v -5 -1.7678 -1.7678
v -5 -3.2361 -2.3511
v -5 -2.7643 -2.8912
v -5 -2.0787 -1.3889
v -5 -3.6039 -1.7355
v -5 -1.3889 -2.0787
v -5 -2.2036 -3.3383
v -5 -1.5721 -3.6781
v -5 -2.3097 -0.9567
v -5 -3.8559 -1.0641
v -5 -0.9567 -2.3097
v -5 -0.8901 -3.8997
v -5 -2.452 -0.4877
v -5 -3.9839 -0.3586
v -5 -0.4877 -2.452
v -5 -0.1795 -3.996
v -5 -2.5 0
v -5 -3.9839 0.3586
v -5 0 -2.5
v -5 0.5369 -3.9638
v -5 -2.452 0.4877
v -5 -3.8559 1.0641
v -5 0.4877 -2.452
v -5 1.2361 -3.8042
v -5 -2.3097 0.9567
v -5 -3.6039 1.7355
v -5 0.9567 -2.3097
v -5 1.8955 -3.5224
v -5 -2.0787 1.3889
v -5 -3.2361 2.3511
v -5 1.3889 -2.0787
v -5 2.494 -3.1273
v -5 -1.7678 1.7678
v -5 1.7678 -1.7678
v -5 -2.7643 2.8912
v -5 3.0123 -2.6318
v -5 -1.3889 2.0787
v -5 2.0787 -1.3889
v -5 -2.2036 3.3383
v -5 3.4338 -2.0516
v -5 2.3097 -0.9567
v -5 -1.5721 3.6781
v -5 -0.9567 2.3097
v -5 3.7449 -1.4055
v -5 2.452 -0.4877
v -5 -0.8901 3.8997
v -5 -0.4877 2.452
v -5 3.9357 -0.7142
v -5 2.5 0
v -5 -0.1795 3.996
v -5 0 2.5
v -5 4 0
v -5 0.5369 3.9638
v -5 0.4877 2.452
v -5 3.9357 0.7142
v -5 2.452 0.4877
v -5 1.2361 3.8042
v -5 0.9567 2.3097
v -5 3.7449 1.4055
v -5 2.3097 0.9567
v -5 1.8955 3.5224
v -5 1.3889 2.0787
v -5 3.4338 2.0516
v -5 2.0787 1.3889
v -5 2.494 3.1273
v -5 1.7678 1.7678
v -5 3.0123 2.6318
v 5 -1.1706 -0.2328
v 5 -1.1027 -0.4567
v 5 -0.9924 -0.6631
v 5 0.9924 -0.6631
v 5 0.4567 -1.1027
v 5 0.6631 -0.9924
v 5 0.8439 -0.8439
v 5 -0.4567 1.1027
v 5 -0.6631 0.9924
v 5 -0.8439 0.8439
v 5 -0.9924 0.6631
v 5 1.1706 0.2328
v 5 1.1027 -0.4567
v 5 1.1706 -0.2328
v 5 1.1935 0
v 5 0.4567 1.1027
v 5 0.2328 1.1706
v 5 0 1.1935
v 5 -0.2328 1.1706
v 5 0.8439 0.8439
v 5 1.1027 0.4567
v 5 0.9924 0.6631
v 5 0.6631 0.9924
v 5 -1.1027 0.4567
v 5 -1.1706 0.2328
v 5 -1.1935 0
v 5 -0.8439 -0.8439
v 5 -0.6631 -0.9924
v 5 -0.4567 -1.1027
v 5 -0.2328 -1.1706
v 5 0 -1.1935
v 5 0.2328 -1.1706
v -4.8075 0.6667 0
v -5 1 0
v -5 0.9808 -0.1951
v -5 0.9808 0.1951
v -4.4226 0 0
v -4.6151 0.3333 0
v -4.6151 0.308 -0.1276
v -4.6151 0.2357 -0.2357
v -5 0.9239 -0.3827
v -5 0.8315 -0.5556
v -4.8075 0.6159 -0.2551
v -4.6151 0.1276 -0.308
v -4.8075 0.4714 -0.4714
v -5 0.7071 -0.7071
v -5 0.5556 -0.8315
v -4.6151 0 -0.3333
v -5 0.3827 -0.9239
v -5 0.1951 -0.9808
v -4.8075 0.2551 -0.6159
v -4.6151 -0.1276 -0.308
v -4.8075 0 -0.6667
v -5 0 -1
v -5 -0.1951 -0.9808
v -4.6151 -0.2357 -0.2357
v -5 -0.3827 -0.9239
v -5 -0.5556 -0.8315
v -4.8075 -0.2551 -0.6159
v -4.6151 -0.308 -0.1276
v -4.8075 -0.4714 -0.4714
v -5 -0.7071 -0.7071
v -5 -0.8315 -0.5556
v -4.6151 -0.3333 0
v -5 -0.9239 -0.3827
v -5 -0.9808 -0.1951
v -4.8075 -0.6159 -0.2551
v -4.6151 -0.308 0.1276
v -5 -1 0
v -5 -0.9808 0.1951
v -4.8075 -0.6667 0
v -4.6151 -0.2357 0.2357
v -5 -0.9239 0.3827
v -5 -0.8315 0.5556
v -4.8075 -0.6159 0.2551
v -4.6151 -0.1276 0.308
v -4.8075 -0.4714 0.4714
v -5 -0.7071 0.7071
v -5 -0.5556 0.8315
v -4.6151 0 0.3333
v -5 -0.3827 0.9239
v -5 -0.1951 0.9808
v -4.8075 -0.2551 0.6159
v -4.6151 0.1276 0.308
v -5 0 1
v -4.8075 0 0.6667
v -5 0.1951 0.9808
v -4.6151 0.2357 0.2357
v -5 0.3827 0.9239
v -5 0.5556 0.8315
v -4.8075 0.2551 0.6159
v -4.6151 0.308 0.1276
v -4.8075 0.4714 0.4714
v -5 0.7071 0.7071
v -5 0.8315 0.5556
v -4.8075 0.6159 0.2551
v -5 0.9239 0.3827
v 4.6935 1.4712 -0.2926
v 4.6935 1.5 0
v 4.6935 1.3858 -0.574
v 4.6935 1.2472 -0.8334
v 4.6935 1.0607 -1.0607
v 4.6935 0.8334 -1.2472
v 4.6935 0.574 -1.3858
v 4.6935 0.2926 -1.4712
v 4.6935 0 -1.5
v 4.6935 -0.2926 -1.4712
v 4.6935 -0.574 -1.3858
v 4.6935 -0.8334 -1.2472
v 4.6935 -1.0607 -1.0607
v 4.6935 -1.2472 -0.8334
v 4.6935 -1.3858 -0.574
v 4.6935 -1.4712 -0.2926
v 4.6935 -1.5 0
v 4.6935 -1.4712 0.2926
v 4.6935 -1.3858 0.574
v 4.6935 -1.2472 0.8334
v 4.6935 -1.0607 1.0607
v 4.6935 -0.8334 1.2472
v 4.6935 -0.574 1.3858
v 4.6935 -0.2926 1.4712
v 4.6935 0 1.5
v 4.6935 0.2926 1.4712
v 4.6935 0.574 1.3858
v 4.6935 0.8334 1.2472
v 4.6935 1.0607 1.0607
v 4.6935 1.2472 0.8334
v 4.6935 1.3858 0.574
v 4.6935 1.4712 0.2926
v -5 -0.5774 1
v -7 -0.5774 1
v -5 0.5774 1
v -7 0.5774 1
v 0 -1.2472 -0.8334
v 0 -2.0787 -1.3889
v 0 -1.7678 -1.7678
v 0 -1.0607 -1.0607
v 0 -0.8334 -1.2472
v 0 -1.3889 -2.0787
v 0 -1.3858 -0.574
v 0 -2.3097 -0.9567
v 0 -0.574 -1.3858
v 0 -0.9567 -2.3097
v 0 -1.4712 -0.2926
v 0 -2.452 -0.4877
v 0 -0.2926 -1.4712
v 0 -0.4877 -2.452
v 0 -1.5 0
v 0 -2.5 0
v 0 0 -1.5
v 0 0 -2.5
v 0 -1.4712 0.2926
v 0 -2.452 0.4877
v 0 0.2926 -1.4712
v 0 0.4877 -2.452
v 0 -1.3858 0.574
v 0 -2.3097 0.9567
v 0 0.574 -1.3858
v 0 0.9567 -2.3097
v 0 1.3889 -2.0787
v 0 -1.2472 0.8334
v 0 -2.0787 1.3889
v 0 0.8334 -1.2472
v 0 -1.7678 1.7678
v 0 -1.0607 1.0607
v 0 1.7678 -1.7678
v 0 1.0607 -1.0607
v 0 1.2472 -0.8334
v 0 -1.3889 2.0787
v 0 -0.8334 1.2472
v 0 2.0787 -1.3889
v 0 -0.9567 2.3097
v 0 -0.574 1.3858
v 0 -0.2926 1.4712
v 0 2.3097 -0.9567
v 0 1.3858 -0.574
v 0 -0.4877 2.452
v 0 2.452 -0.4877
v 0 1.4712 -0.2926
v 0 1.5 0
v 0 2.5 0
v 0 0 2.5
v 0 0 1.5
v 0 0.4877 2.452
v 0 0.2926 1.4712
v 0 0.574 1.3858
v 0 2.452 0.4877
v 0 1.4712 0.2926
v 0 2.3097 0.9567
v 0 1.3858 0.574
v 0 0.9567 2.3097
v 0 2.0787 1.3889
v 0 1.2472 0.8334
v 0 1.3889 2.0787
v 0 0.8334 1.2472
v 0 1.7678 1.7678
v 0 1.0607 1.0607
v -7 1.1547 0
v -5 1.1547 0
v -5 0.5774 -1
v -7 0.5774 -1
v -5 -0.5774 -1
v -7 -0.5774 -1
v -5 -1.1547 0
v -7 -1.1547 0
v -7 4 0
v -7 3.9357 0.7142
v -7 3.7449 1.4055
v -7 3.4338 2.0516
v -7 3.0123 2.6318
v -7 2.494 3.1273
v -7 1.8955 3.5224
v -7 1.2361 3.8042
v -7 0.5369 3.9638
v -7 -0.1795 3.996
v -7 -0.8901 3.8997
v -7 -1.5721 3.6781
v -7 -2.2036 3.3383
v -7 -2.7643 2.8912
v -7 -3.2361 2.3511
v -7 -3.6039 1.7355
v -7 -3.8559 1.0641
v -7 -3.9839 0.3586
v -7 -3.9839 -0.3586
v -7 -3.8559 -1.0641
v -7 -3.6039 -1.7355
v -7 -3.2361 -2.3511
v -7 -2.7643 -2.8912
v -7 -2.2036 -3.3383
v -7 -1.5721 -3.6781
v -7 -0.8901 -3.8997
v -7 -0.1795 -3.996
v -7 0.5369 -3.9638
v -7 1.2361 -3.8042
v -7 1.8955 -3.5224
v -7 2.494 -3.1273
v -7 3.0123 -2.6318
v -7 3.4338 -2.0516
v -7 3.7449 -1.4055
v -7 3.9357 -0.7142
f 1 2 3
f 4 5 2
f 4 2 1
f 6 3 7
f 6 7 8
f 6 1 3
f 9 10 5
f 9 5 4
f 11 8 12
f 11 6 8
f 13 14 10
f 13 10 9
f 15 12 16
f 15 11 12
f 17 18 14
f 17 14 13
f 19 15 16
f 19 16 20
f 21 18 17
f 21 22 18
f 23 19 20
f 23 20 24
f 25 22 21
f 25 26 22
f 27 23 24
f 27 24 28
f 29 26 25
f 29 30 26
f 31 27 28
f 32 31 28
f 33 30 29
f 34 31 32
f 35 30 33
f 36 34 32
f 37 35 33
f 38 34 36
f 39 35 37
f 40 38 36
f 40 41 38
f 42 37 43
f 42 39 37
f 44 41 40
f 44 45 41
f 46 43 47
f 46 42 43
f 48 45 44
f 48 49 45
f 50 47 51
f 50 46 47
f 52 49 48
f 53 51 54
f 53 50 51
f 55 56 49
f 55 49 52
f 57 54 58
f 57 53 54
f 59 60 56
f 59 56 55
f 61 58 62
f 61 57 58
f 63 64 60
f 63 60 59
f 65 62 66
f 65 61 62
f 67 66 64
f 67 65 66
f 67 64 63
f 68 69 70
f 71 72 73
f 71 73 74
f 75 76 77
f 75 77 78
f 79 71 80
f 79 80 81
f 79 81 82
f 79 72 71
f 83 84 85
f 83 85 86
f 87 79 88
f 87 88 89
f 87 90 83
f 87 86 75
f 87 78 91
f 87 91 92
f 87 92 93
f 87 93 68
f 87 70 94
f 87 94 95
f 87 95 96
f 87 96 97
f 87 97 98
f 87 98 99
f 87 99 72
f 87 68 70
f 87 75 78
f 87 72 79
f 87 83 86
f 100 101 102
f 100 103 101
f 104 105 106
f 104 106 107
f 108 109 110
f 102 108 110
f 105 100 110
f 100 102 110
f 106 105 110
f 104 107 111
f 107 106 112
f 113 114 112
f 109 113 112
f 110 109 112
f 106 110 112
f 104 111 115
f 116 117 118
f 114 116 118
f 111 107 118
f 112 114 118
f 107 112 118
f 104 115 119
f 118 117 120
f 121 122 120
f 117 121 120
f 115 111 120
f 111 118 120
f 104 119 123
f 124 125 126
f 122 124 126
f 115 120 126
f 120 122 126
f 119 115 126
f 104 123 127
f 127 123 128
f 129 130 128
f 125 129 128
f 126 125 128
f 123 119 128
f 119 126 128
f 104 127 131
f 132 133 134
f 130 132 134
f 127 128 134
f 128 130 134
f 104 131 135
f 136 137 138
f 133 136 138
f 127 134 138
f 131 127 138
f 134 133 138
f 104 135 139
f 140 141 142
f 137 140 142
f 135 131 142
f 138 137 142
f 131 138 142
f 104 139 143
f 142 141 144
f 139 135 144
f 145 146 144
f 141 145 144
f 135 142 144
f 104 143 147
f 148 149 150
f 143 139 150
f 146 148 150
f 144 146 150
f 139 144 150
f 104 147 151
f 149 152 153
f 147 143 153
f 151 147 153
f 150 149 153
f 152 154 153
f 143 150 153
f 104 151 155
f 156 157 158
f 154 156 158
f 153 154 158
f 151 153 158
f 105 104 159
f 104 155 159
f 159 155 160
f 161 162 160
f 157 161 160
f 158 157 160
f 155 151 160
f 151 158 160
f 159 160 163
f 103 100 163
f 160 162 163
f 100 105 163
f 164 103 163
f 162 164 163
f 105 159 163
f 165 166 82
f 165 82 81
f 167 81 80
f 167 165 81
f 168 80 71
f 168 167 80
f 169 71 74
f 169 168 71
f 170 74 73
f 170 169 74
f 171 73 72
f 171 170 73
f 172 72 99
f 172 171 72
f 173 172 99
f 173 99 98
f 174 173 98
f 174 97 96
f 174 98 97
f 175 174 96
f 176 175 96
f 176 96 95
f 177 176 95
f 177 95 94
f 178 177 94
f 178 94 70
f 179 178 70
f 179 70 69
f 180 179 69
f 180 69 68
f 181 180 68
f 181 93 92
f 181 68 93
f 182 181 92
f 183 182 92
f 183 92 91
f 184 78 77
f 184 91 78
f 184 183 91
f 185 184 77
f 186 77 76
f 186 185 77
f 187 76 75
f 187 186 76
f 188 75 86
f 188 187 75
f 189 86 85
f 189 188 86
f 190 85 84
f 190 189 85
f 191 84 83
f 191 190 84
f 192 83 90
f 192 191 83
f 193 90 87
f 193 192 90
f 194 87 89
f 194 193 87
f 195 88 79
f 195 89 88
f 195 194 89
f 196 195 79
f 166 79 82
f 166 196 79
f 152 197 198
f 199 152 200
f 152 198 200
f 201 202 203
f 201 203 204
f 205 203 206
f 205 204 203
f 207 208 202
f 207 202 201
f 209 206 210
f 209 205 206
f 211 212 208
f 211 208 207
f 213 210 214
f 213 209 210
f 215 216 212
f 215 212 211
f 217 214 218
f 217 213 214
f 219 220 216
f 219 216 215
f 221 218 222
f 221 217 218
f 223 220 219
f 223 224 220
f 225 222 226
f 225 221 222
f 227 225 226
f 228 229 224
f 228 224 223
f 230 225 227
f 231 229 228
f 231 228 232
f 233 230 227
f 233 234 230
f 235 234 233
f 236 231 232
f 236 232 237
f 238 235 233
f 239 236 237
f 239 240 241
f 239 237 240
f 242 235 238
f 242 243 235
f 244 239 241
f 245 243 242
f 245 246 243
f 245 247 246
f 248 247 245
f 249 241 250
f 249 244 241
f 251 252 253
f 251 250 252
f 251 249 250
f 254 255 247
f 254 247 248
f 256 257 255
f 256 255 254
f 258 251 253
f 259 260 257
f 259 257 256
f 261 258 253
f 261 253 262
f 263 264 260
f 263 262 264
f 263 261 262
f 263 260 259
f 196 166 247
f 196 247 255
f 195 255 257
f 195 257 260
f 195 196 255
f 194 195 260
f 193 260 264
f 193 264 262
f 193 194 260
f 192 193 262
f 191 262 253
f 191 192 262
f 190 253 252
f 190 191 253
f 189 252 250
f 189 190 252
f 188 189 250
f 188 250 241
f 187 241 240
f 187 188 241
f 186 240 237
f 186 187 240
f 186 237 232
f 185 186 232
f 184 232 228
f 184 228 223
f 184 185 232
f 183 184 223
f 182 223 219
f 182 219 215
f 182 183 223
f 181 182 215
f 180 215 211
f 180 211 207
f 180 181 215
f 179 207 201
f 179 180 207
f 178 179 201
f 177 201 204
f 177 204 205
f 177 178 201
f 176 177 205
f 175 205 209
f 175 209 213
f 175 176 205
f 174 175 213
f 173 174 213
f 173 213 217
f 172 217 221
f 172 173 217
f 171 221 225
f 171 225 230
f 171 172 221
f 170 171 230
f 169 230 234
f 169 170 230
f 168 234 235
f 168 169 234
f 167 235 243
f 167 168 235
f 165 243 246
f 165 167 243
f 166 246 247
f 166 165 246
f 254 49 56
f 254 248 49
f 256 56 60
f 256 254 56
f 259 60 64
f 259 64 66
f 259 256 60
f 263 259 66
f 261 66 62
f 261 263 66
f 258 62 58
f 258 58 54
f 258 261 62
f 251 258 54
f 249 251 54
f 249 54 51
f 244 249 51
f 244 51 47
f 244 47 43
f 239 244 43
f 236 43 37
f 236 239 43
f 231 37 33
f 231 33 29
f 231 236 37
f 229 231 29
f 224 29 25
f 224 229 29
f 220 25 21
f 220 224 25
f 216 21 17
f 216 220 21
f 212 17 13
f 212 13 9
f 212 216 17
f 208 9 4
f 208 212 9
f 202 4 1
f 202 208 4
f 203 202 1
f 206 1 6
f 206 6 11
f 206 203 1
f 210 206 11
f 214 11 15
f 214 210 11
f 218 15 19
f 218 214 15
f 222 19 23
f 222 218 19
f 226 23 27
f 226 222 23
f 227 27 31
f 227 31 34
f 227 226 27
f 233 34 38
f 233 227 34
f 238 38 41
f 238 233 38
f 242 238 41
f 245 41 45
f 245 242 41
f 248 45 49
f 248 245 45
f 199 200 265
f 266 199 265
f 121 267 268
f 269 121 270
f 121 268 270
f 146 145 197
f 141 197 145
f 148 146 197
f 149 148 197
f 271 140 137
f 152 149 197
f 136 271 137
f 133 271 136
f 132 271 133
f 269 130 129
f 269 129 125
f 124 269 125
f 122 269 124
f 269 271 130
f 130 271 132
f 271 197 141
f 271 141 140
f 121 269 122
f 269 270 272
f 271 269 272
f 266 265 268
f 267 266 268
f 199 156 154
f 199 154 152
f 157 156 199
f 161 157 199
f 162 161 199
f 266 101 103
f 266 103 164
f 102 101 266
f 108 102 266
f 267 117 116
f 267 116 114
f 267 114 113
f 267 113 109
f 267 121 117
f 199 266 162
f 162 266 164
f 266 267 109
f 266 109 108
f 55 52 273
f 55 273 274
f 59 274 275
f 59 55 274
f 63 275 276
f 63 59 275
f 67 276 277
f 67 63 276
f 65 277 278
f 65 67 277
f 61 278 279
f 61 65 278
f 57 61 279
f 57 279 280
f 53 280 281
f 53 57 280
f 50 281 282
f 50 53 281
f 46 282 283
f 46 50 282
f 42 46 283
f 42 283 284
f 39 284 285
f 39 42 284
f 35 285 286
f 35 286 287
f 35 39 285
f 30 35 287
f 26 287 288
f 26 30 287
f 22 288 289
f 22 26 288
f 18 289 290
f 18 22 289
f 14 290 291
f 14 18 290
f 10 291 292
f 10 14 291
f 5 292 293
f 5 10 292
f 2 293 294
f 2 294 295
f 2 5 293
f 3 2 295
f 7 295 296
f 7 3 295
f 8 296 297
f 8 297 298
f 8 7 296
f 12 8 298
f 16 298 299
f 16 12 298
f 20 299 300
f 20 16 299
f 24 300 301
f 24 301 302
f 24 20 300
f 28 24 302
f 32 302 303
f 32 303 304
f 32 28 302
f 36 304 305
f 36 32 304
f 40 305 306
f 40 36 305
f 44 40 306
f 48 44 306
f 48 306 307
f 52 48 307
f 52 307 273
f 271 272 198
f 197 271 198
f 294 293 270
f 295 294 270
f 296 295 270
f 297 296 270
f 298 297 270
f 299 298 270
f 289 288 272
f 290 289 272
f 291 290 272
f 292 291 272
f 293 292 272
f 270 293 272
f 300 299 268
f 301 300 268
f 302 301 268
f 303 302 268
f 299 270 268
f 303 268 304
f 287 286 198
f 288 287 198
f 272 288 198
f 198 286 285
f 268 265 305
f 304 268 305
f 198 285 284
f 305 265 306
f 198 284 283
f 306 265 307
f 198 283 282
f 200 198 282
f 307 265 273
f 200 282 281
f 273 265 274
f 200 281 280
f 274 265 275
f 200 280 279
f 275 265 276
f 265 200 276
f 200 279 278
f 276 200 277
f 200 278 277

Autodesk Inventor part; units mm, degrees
ref_plane "YZ Plane" through (0, 0, 0) normal (1, 0, 0) x (0, 1, 0)
ref_plane "XZ Plane" through (0, 0, 0) normal (0, 1, 0) x (-1, 0, 0)
ref_plane "XY Plane" through (0, 0, 0) normal (0, 0, 1) x (1, 0, 0)
sketch "Sketch_1" plane through (0, 0, 0) normal (0, 0, 1) x (1, 0, 0)
  line L0 (5, 0) -> (-7, 0)
  line L1 (-7, 0) -> (-7, 4)
  line L2 (-7, 4) -> (-5, 4)
  line L3 (-5, 4) -> (-5, 2.5)
  line L4 (-5, 2.5) -> (0, 2.5)
  line L5 (0, 2.5) -> (0, 1.5)
  line L6 (0, 1.5) -> (4.6935, 1.5)
  line L7 (4.6935, 1.5) -> (5, 1.1935)
  line L8 (5, 1.1935) -> (5, 0)
  line L9 (5, 0) -> (-7, 0)
revolve "Revolution1" add sketch "Sketch_1" angle 360 about axis through (5, 0, 0) along (1, 0, 0)
thread "Thread1" size "M3x0.5" class "6g" standard "ISO Metric profile" length 3.6935
sketch "Sketch_2" plane through (-7, 0, 0) normal (-1, 0, 0) x (0, 1, 0)
  line L0 (-1.1547, 0) -> (-0.5774, -1)
  line L1 (-0.5774, -1) -> (0.5774, -1)
  line L2 (0.5774, -1) -> (1.1547, 0)
  line L3 (1.1547, 0) -> (0.5774, 1)
  line L4 (0.5774, 1) -> (-0.5774, 1)
  line L5 (-0.5774, 1) -> (-1.1547, 0)
extrude "Extrusion1" cut sketch "Sketch_2" against normal blind 2
sketch "Sketch_3" plane through (0, 0, 0) normal (0, 0, 1) x (1, 0, 0)
  line L0 (-4.4226, 0) -> (-5, 0)
  line L1 (-5, 0) -> (-5, 1)
  line L2 (-5, 1) -> (-4.4226, 0)
  line L3 (-4.4226, 0) -> (-5, 0)
revolve "Revolution2" cut sketch "Sketch_3" angle 360 about axis through (-4.4226, 0, 0) along (1, 0, 0)
properties part number "DBB3-5-5"
